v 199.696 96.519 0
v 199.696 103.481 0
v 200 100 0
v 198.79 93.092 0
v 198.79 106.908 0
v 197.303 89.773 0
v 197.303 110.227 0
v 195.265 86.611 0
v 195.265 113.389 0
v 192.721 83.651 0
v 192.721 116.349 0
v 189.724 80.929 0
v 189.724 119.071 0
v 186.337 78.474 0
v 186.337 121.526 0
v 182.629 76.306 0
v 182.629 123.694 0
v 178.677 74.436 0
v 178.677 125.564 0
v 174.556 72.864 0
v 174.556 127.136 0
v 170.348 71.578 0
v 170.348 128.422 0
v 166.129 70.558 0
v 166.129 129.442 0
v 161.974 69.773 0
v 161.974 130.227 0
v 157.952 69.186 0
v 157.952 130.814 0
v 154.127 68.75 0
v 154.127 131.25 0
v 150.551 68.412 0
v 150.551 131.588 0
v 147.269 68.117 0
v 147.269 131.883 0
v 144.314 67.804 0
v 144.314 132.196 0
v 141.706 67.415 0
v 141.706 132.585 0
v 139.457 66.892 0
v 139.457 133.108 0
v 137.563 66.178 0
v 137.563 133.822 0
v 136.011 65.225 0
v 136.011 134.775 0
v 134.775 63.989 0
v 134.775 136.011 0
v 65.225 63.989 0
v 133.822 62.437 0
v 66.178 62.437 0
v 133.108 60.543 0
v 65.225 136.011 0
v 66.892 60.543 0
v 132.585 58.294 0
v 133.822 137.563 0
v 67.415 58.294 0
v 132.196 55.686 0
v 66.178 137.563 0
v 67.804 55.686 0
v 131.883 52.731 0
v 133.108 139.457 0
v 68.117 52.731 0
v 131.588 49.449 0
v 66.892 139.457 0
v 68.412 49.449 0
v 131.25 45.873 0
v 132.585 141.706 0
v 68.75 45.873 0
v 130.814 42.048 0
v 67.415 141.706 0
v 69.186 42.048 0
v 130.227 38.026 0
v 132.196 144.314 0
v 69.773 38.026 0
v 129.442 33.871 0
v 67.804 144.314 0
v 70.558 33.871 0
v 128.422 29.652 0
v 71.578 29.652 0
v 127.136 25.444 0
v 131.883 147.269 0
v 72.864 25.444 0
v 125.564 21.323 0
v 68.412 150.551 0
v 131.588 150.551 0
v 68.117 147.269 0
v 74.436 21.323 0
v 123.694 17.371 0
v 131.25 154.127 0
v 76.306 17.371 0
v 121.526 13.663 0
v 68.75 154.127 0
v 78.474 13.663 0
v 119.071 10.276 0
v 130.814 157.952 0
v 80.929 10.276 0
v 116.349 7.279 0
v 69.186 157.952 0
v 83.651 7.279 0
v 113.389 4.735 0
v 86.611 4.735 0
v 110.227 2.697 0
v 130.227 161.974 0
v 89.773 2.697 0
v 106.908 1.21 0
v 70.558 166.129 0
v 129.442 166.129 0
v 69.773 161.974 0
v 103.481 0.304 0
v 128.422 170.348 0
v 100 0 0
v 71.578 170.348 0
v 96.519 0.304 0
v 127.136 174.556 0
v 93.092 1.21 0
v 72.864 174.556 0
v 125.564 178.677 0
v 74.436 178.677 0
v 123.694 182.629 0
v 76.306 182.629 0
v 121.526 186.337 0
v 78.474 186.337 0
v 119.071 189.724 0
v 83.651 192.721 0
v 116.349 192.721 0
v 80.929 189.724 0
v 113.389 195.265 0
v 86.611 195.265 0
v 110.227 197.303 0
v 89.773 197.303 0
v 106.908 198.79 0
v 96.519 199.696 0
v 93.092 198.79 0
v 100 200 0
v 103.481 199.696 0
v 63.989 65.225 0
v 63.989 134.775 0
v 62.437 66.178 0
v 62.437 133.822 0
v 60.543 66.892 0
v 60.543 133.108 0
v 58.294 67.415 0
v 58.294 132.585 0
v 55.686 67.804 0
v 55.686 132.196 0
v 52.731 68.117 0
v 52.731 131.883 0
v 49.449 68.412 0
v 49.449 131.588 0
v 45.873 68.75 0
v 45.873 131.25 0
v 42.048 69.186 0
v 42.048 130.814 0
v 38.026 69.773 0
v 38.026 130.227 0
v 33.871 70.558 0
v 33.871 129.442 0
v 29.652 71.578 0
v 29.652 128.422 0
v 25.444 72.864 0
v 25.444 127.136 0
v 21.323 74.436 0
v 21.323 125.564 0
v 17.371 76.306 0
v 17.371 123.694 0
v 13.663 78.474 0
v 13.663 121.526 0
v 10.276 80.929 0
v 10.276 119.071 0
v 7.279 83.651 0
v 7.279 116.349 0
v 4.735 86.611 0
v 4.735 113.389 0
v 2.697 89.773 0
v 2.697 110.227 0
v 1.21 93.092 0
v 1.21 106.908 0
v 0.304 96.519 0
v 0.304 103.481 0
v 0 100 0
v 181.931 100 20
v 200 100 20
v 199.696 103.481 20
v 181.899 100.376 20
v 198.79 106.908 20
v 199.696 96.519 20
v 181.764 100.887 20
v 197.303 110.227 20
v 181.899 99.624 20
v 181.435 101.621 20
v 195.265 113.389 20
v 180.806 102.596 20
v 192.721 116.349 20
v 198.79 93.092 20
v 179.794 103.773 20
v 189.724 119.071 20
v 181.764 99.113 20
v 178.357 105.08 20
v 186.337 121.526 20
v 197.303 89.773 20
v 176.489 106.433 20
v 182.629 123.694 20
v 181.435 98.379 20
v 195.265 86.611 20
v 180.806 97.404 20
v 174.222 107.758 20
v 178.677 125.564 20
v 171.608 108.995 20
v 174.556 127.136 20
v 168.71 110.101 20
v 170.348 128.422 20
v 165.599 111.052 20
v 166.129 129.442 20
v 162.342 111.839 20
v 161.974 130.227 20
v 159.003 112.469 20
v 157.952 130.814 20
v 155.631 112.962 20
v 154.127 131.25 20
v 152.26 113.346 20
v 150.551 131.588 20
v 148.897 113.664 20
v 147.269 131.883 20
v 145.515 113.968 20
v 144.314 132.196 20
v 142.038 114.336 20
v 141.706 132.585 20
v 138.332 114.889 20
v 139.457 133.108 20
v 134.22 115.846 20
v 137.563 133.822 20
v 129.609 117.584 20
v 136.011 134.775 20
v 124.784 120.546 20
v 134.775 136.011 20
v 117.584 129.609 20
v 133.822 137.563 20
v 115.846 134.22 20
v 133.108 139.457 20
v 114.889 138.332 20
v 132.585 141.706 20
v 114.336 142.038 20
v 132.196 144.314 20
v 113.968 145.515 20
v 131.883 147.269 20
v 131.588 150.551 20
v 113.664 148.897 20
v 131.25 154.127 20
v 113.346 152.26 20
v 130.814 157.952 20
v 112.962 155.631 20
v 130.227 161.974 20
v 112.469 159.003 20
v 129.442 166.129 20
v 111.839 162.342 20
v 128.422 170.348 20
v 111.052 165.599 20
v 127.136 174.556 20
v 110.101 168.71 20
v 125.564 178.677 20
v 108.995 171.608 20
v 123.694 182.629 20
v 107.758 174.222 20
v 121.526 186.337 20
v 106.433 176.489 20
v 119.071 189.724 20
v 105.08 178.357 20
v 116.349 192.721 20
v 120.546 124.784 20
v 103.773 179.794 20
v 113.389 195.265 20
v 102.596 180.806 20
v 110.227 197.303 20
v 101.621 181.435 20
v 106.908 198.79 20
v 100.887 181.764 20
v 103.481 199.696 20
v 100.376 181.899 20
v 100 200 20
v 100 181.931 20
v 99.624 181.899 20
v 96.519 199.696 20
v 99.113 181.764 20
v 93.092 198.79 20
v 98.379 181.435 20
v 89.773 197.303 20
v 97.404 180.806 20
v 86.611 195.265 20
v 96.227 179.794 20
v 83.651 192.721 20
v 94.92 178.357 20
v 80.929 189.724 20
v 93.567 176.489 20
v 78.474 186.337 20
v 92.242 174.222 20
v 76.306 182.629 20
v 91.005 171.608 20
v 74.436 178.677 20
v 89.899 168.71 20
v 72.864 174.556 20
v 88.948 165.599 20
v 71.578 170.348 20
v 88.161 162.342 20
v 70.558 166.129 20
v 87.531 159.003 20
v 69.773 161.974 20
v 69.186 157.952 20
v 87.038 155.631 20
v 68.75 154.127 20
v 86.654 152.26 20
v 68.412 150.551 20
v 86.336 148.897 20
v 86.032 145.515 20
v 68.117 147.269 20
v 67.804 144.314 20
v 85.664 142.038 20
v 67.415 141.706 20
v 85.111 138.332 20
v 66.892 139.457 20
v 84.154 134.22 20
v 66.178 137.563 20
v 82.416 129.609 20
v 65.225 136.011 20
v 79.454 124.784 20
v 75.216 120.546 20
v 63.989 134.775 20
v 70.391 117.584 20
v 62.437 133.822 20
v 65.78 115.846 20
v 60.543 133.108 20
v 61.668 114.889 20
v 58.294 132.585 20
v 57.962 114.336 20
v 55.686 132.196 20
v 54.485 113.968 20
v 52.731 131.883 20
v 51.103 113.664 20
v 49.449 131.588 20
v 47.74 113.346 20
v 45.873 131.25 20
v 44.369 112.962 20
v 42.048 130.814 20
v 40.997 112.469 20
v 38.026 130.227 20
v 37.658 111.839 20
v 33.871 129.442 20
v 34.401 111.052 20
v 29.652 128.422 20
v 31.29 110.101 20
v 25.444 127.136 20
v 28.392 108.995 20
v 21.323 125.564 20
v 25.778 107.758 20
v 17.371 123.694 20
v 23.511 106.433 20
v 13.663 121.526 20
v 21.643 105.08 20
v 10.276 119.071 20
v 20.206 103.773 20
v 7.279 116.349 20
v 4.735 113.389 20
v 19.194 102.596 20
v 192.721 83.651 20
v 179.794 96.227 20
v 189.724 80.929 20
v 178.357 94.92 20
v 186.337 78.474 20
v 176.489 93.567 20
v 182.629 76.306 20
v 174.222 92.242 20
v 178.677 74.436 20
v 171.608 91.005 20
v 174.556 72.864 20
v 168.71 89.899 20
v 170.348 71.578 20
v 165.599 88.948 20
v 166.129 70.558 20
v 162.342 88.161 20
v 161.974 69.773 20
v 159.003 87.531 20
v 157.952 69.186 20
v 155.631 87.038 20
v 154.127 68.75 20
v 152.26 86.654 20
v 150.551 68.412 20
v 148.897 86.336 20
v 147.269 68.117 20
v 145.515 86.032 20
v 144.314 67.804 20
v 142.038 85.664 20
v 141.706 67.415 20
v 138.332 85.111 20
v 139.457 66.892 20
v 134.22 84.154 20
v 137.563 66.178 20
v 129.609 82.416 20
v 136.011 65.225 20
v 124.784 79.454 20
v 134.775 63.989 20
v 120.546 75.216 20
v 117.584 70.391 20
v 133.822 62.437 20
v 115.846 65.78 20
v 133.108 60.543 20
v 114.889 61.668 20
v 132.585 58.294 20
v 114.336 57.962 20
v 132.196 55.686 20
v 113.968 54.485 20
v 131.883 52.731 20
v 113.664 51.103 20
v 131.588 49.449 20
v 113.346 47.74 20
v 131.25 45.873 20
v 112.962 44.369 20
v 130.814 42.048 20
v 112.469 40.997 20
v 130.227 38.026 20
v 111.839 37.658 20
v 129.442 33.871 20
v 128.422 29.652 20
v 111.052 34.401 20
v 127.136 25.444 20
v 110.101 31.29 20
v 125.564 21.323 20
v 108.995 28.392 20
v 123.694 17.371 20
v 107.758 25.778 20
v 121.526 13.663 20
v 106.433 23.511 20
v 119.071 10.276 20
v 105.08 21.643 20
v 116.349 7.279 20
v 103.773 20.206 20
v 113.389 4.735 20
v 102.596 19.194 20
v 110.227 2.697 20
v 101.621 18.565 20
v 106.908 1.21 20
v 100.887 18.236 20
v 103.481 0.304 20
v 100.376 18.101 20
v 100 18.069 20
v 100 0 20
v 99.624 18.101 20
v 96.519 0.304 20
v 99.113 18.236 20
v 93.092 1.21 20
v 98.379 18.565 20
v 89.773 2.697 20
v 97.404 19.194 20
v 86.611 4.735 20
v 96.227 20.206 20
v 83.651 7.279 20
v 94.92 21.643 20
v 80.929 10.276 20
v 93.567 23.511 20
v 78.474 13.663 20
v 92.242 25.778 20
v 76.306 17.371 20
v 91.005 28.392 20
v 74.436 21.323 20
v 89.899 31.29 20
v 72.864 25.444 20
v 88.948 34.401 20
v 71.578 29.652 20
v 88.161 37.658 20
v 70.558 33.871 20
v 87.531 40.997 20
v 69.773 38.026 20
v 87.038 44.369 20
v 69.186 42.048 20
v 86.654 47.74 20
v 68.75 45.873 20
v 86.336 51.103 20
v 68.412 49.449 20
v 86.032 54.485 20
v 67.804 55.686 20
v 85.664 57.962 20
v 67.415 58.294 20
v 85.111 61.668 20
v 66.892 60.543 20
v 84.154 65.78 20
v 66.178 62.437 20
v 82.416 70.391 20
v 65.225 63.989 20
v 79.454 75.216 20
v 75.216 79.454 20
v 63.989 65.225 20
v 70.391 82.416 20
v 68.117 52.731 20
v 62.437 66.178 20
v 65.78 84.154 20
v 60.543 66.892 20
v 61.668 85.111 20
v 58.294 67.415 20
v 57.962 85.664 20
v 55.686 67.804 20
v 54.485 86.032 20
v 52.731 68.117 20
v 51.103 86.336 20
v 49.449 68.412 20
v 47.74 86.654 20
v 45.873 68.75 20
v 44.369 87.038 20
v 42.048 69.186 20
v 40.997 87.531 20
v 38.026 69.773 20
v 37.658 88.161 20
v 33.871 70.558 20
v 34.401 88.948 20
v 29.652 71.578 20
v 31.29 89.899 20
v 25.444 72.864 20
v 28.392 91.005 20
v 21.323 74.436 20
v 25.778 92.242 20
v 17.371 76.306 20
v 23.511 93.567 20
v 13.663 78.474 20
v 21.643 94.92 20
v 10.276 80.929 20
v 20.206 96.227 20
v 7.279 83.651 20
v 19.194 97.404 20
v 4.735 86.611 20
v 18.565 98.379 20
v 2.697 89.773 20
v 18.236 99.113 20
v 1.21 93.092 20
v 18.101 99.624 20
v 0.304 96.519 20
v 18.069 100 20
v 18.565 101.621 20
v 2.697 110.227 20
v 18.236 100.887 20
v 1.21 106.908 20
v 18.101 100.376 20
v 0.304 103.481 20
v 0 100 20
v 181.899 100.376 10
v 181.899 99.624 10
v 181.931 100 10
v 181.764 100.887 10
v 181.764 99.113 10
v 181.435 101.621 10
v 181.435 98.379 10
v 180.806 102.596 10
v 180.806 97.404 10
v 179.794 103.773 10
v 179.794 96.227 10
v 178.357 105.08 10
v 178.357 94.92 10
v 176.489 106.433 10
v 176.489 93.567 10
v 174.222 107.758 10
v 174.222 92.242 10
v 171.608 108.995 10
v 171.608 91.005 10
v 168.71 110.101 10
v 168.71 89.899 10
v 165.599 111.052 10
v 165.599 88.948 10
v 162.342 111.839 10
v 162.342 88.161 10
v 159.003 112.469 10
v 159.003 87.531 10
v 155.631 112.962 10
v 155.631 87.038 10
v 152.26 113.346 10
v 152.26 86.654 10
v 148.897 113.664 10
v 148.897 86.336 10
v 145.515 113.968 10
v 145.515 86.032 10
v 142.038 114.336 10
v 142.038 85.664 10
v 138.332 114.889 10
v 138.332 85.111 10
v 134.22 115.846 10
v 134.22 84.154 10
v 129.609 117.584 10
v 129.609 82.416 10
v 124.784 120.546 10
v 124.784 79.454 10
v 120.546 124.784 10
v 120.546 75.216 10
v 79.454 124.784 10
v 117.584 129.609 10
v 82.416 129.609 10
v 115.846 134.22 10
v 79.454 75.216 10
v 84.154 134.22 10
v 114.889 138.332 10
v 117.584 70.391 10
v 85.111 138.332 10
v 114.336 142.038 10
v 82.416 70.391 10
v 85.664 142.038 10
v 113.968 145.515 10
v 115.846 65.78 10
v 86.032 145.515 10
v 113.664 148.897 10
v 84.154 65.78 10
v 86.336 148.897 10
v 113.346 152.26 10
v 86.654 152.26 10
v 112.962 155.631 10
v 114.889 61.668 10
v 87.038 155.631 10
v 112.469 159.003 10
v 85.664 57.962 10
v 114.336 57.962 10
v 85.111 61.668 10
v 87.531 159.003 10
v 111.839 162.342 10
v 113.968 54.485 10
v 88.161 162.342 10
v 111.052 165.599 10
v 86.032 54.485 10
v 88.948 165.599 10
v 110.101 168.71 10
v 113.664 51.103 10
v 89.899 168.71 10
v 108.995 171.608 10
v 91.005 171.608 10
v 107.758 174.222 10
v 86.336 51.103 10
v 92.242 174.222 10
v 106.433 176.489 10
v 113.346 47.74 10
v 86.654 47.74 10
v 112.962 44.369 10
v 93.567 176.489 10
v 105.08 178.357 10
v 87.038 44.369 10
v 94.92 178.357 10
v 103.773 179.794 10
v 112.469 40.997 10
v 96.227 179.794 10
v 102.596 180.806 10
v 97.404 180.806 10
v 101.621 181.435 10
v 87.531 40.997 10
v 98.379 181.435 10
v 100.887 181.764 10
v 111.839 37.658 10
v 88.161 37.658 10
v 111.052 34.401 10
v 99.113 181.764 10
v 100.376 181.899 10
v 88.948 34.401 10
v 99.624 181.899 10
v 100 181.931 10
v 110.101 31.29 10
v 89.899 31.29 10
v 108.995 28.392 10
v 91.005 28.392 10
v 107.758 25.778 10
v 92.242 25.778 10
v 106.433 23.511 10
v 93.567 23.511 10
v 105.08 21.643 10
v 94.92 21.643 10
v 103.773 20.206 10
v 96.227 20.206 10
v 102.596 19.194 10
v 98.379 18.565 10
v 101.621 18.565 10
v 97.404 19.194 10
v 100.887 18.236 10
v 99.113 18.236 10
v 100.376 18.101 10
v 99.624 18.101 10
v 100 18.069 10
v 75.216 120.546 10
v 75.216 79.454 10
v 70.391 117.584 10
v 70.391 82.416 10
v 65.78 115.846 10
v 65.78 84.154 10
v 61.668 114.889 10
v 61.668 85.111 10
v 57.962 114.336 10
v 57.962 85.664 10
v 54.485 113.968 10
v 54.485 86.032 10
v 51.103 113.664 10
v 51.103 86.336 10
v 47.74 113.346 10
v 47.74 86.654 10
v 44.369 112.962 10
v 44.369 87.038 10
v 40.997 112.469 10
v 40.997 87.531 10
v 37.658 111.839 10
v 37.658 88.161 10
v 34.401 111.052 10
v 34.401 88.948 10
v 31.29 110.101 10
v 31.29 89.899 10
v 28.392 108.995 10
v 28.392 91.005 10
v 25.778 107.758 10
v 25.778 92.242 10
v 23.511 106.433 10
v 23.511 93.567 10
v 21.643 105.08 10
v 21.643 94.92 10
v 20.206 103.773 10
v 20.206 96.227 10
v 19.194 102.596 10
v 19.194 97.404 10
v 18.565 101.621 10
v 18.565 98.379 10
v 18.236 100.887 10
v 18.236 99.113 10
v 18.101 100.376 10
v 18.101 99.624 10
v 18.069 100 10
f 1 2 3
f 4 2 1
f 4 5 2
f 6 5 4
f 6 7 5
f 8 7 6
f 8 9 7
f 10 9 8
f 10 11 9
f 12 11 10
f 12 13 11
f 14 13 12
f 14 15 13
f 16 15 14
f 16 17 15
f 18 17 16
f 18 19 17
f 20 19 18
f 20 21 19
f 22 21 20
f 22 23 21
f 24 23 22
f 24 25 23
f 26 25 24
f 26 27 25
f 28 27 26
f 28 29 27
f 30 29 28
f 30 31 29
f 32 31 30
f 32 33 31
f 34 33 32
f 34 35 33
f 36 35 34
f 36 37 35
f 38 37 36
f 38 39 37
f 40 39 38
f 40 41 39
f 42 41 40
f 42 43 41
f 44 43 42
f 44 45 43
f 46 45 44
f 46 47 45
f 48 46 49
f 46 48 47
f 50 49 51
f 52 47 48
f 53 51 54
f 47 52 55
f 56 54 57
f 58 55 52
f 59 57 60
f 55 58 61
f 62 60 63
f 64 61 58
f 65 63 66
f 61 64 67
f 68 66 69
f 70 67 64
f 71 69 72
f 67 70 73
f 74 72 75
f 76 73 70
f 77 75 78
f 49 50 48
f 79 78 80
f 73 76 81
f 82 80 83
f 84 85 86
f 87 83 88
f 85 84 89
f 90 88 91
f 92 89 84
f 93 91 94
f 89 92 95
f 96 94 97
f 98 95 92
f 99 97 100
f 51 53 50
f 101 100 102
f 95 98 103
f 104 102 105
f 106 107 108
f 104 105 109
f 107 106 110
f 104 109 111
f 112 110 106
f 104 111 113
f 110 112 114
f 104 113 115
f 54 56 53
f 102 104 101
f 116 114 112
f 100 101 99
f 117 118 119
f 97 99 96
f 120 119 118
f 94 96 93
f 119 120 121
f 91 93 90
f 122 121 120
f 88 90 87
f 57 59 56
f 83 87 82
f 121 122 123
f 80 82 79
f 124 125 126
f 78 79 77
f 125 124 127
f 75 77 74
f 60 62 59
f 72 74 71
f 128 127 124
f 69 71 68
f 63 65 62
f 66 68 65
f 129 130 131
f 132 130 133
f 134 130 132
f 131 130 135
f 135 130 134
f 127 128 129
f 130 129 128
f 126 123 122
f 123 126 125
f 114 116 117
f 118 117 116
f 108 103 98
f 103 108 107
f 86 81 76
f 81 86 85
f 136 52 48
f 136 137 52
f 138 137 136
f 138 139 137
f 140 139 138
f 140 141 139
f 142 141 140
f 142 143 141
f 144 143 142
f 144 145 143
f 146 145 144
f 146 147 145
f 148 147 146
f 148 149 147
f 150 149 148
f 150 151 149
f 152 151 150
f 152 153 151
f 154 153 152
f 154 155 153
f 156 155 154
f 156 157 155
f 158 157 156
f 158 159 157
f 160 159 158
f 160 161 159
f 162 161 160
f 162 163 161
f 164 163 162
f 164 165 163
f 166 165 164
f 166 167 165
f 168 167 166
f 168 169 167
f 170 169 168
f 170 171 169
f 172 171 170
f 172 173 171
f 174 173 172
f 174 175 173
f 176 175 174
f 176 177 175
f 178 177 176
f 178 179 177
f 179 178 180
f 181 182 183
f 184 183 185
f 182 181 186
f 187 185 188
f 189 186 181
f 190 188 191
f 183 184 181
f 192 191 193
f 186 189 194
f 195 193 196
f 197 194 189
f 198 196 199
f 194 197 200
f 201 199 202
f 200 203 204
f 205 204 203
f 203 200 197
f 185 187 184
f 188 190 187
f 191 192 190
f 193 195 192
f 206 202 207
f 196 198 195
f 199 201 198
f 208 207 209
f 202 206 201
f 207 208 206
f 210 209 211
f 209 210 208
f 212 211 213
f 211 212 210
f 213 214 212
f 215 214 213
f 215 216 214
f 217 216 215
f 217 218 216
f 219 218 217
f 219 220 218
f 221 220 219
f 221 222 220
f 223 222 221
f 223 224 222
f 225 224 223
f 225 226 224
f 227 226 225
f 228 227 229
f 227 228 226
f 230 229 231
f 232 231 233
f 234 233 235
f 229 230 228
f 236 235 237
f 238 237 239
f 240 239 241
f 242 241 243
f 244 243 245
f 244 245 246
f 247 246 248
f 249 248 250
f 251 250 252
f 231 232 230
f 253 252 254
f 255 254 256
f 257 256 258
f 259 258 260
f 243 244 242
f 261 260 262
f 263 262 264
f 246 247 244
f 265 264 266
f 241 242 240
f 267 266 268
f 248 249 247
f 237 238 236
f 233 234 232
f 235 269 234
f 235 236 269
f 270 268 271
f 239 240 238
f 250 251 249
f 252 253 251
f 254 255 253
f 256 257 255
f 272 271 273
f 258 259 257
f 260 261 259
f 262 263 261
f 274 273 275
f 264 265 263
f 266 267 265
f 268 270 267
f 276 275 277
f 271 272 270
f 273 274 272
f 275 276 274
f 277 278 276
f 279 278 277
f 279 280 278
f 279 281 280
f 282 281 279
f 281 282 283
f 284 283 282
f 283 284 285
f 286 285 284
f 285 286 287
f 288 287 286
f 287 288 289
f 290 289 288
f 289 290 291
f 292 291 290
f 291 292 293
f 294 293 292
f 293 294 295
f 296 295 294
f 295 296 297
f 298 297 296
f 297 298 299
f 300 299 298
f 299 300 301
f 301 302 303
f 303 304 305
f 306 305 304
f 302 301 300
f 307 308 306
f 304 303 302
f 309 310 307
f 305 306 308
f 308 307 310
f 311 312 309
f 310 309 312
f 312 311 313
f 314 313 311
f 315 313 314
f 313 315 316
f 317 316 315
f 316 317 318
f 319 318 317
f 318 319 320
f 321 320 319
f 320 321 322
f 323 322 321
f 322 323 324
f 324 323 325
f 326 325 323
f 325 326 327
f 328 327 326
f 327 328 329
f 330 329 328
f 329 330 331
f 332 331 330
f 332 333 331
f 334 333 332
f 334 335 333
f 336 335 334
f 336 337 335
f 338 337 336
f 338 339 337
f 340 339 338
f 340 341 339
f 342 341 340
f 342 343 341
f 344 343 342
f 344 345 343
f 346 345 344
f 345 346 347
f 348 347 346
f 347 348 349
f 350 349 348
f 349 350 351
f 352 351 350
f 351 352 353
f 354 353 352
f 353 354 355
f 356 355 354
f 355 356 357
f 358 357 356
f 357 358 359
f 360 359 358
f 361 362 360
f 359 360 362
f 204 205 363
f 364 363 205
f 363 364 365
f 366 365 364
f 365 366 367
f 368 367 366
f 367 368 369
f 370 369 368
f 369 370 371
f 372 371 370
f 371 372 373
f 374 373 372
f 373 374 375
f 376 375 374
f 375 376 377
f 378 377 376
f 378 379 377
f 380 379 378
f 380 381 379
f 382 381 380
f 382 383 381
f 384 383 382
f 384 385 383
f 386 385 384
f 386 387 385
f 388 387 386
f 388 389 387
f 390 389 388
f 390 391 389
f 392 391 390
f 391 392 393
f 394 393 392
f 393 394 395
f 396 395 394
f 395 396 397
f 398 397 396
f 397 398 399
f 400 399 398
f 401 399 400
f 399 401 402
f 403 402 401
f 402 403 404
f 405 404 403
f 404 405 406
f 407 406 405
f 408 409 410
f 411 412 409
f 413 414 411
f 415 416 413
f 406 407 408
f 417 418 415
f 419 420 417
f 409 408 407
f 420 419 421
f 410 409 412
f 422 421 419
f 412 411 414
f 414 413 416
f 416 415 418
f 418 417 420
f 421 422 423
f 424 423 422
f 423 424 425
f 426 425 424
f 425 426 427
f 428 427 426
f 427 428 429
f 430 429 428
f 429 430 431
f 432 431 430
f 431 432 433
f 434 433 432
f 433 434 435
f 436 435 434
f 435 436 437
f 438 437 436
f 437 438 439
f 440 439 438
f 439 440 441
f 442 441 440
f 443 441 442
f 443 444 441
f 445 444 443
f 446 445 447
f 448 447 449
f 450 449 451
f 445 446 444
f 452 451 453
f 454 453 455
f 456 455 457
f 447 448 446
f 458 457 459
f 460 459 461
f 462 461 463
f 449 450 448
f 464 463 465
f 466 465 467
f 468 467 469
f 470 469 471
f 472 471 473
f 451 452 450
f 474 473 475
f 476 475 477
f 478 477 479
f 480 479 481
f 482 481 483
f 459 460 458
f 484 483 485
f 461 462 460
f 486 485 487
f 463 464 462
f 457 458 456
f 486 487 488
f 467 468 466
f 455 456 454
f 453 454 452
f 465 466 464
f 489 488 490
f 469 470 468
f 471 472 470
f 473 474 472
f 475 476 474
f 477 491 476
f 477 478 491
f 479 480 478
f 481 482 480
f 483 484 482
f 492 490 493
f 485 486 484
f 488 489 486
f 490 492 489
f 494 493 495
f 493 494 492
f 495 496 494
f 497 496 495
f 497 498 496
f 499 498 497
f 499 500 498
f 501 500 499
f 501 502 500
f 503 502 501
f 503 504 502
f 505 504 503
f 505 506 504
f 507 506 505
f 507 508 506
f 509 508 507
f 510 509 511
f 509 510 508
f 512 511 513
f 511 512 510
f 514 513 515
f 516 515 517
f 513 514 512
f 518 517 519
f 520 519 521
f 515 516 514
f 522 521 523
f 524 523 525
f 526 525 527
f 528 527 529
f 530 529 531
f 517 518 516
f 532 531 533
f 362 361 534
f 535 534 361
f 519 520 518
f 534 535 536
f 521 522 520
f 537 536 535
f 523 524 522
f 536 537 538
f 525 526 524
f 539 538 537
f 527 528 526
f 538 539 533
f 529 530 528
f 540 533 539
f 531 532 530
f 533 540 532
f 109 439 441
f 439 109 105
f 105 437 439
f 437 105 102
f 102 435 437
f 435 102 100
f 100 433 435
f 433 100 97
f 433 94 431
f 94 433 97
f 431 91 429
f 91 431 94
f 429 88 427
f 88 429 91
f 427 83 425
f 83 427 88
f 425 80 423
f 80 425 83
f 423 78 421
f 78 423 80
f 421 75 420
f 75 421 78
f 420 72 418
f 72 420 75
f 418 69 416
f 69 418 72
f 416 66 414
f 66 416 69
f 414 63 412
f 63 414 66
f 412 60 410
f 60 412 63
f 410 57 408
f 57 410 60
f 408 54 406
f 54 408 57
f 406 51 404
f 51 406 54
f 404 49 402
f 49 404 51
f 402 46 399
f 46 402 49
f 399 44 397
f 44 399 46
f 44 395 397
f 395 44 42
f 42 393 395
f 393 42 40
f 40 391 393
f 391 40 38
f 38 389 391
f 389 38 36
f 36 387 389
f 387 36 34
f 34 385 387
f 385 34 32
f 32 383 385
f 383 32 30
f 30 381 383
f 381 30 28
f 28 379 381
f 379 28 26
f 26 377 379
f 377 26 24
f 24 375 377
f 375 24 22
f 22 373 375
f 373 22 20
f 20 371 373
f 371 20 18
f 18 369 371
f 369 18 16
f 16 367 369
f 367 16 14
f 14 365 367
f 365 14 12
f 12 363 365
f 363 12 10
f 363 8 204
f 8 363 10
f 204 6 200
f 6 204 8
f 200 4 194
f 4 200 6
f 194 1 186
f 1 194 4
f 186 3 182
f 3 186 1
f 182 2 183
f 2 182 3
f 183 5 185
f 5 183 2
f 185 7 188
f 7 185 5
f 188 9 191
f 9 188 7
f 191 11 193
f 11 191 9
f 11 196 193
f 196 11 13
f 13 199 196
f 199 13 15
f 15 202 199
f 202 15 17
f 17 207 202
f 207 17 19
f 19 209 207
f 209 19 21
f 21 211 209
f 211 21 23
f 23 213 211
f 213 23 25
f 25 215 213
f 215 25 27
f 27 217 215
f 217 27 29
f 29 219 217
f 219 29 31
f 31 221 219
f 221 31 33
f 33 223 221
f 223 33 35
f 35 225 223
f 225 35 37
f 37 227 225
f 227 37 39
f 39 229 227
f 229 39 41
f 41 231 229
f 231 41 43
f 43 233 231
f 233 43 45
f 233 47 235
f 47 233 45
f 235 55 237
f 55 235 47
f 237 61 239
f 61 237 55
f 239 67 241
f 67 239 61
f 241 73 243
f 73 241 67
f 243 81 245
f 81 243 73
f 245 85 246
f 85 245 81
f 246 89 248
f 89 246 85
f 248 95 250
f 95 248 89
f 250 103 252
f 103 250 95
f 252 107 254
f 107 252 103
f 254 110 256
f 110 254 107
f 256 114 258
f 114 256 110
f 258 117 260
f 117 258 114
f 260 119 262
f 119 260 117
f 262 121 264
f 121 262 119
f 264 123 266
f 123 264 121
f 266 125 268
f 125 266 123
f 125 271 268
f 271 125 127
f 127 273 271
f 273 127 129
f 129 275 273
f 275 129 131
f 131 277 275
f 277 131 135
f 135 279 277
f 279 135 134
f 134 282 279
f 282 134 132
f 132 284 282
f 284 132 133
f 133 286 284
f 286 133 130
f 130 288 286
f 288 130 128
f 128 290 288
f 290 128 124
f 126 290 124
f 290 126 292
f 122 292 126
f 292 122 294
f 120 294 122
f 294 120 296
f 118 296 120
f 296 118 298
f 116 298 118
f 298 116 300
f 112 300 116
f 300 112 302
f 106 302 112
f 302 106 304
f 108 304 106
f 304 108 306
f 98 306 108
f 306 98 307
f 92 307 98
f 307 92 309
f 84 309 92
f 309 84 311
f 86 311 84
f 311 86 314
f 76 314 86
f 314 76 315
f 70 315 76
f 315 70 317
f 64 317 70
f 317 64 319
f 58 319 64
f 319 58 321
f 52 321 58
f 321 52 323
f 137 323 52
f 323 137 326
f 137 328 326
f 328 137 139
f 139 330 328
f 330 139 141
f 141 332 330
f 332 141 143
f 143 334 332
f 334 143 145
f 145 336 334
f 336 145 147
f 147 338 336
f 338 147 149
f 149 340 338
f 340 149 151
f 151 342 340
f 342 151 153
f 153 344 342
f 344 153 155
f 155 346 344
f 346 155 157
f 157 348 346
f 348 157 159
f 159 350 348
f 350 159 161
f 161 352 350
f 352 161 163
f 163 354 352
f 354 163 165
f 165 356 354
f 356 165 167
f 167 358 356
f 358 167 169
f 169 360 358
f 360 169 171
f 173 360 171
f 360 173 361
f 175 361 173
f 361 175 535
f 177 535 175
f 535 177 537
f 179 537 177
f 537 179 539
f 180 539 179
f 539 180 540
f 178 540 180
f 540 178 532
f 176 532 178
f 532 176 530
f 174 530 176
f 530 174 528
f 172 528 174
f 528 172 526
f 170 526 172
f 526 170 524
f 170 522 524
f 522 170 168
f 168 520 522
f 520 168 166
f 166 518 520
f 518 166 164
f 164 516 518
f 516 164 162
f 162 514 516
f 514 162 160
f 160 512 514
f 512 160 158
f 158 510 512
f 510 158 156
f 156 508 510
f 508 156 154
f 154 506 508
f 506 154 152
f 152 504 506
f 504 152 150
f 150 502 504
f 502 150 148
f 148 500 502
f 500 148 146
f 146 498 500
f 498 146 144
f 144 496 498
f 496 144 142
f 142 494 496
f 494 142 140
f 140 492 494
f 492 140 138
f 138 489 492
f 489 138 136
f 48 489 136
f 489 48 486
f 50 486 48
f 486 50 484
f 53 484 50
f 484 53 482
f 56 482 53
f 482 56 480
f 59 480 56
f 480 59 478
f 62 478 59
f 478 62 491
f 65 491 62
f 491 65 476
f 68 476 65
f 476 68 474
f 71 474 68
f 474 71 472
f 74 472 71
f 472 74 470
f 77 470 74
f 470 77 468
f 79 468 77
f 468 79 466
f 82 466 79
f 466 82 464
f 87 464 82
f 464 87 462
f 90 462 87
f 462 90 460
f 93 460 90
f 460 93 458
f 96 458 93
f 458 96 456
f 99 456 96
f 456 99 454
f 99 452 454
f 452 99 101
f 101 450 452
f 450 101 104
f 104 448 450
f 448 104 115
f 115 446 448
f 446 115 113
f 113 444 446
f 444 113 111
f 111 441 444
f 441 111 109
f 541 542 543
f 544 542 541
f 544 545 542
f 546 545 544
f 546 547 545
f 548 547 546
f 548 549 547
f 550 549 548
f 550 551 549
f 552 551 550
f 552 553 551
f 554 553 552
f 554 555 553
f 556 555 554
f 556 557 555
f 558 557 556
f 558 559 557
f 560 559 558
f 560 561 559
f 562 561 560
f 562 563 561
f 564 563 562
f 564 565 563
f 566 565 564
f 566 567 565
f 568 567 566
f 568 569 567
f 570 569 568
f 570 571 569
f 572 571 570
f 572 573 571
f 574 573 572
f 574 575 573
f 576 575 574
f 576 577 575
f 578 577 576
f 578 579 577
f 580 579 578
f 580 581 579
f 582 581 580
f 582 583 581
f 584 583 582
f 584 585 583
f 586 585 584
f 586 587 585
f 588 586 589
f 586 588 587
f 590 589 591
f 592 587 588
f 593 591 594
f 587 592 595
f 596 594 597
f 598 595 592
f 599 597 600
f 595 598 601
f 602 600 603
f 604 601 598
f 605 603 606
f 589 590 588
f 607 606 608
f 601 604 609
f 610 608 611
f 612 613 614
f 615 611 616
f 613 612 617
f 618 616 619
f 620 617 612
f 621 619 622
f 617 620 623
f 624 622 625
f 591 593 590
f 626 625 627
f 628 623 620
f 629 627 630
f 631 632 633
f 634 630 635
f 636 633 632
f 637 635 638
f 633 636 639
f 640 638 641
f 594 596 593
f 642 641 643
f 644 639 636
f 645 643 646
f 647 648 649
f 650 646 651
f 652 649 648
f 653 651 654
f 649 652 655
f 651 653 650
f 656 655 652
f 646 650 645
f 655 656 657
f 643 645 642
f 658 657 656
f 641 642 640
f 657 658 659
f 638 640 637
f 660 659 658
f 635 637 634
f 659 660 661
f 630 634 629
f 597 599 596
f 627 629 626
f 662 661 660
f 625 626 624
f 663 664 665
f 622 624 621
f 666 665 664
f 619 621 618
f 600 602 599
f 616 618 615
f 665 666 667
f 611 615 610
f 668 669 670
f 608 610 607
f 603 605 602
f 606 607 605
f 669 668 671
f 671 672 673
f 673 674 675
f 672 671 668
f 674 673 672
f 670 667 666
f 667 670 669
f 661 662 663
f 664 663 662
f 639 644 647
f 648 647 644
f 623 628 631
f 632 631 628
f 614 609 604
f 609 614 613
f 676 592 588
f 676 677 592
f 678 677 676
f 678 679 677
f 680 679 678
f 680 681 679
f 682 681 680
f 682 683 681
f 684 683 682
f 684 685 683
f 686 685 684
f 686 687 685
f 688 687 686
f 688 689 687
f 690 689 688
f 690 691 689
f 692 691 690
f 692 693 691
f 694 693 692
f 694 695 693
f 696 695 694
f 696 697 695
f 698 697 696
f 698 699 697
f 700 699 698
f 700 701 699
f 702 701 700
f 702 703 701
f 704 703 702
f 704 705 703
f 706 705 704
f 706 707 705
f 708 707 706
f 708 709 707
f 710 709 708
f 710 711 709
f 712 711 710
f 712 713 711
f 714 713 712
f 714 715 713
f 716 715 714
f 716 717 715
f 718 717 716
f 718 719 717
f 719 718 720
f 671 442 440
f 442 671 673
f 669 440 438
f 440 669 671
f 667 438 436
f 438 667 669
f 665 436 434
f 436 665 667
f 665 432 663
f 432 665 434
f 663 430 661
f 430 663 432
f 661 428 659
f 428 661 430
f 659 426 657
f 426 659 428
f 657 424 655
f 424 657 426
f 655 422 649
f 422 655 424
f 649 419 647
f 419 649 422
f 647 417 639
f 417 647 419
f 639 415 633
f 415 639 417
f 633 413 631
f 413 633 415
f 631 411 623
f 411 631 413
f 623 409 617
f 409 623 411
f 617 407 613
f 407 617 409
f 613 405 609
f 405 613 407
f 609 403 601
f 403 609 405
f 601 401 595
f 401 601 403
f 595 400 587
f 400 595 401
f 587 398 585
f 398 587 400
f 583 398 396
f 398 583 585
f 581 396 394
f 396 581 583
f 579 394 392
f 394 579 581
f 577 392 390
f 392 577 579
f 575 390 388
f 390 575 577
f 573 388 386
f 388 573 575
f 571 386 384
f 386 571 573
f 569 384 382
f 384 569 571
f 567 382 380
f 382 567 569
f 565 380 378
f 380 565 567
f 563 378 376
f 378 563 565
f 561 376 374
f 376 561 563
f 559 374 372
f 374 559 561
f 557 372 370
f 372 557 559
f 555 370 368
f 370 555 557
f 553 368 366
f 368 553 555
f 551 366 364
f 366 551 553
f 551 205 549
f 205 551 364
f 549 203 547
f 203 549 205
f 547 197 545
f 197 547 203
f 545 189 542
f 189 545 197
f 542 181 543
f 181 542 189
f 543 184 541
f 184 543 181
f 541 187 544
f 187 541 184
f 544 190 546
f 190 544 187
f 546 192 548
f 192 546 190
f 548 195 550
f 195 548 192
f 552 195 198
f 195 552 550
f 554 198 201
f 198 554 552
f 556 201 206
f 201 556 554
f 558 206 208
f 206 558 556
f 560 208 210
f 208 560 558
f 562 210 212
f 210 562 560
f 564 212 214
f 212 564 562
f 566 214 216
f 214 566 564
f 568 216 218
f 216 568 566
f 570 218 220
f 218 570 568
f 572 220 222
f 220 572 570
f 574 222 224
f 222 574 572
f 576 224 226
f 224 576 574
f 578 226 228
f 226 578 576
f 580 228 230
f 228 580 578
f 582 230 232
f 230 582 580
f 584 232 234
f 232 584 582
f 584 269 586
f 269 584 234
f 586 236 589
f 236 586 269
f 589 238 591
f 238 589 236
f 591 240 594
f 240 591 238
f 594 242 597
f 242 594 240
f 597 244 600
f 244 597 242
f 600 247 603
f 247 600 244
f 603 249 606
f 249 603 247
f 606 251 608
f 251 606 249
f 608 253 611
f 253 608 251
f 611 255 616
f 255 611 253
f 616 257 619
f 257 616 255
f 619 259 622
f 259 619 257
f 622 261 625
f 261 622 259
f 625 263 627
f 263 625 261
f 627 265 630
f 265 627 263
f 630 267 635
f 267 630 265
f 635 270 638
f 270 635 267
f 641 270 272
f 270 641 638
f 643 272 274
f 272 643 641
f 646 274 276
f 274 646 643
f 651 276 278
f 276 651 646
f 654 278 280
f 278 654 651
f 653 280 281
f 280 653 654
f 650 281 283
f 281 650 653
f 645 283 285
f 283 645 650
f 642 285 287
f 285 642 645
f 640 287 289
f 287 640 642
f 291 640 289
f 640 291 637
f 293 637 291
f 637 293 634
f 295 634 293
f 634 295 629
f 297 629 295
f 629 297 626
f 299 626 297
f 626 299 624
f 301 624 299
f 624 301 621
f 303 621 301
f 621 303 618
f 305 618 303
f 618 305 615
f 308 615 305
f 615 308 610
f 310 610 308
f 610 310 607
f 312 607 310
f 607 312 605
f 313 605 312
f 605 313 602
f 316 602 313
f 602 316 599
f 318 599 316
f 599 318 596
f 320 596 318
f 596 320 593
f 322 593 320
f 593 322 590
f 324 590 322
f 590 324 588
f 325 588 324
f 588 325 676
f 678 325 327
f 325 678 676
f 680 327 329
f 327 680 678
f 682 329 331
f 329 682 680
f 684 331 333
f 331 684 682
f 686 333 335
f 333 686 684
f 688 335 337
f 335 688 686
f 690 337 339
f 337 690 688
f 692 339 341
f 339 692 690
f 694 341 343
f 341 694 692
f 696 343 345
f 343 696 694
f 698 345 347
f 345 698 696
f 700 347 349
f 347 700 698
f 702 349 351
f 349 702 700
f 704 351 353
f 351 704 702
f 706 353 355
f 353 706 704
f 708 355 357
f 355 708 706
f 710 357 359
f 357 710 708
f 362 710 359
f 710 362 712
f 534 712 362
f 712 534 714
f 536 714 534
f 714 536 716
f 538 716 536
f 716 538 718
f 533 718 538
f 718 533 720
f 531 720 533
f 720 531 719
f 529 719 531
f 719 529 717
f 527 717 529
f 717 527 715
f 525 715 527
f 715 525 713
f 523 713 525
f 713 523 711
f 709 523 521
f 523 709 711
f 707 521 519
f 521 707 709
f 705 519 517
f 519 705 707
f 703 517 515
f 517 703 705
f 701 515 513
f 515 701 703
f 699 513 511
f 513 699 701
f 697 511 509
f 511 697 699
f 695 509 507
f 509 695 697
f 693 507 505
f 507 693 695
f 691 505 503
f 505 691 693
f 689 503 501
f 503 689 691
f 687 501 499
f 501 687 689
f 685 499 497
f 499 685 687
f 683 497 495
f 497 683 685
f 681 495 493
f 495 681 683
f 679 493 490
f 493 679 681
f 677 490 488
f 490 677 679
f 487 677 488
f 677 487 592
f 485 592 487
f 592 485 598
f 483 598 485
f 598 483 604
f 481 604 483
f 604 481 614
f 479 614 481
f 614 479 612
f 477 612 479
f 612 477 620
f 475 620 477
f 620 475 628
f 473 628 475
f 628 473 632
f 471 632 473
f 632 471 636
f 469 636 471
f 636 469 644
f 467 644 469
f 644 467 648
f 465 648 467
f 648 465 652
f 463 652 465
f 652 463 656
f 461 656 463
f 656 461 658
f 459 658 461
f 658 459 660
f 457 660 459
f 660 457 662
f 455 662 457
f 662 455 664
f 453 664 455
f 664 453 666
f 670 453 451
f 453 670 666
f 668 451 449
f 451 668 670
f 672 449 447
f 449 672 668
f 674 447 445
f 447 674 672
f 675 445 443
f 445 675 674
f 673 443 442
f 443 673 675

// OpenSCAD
// === UNITS ===
// units: mm
// All dimensions are converted to millimeters; no inch markings on sketch.

// === SKETCH TRANSCRIPTION ===
//   "200 mm" (bottom horizontal) -> overall board width -> stock_x
//   "200 mm" (right vertical) -> overall board height -> stock_y
//   "pocket" -> central pocket offset inward from outer profile -> pocket_inset, pocket_depth
//   (no thickness or pocket depth shown) -> stock_z, pocket_depth estimated -> TODO

// === PARAMETERS ===
stock_x = 200;                 // overall width of board (mm)
stock_y = 200;                 // overall height of board (mm)
stock_z = 20;                  // overall stock thickness (mm) TODO: verify — not dimensioned on sketch
outer_max_r = stock_x / 2;     // outer profile maximum radius (mm)
outer_base_r = 75;             // rose-curve base radius (mm)
outer_amp_r = outer_max_r - outer_base_r; // rose-curve petal amplitude (mm)
petal_count = 4;               // number of outer lobes / rose frequency
outline_pts = 180;             // polygon segments for outer profile
pocket_inset = 18;             // pocket inward offset from outer edge (mm) TODO: verify — not dimensioned
pocket_depth = stock_z * 0.5;  // pocket depth (mm) TODO: verify — no depth on sketch
eps = 0.1;                     // cutter overshoot (mm)
min_wall = 6;                  // minimum wall thickness (mm)

// === ASSUMPTIONS ===
// Units: no unit symbols, magnitude 200x200 -> mm assumed.
// Board thickness not shown; 20 mm assumed (typical serving-board stock).
// Pocket depth not shown; 0.5 * stock_z = 10 mm assumed.
// Pocket shape assumed to be a uniform inward offset of the outer profile.
// Outer profile approximated as a 4-petal rose curve; exact hand-drawn curve not dimensioned.
// The two 200 mm dimensions are taken as overall width and height, not conflicting.
// Tool diameter default 6.35 mm used for inside-corner feasibility checks.

// === MODEL ===
$fn = 64;

function rose_pt(i, n, base, amp, lobes) =
    [ (base + amp * cos(lobes * i * 360 / n)) * cos(i * 360 / n),
      (base + amp * cos(lobes * i * 360 / n)) * sin(i * 360 / n) ];

module outer_2d() {
    translate([stock_x / 2, stock_y / 2])
        polygon(points = [
            for (i = [0 : outline_pts - 1])
                rose_pt(i, outline_pts, outer_base_r, outer_amp_r, petal_count)
        ]);
}

module pocket_2d() {
    offset(delta = -pocket_inset, $fn = 64) outer_2d();
}

module board() {
    difference() {
        linear_extrude(height = stock_z) outer_2d();
        translate([0, 0, stock_z - pocket_depth])
            linear_extrude(height = pocket_depth + eps) pocket_2d();
    }
}

board();

// === CHECKS ===
// Outer profile max radius 100 mm centered in 200x200 stock; all points inside stock: OK
// Pocket is inward offset 18 mm from outer profile; minimum wall >= 6 mm: OK
// Pocket depth 10 mm leaves 10 mm floor = 50% of stock_z; >= 30% required: OK
// No sharp inside corners on outer or pocket curves; tool radius not violated: OK
// All cuts are from top face at z = stock_z and extend eps above: OK
